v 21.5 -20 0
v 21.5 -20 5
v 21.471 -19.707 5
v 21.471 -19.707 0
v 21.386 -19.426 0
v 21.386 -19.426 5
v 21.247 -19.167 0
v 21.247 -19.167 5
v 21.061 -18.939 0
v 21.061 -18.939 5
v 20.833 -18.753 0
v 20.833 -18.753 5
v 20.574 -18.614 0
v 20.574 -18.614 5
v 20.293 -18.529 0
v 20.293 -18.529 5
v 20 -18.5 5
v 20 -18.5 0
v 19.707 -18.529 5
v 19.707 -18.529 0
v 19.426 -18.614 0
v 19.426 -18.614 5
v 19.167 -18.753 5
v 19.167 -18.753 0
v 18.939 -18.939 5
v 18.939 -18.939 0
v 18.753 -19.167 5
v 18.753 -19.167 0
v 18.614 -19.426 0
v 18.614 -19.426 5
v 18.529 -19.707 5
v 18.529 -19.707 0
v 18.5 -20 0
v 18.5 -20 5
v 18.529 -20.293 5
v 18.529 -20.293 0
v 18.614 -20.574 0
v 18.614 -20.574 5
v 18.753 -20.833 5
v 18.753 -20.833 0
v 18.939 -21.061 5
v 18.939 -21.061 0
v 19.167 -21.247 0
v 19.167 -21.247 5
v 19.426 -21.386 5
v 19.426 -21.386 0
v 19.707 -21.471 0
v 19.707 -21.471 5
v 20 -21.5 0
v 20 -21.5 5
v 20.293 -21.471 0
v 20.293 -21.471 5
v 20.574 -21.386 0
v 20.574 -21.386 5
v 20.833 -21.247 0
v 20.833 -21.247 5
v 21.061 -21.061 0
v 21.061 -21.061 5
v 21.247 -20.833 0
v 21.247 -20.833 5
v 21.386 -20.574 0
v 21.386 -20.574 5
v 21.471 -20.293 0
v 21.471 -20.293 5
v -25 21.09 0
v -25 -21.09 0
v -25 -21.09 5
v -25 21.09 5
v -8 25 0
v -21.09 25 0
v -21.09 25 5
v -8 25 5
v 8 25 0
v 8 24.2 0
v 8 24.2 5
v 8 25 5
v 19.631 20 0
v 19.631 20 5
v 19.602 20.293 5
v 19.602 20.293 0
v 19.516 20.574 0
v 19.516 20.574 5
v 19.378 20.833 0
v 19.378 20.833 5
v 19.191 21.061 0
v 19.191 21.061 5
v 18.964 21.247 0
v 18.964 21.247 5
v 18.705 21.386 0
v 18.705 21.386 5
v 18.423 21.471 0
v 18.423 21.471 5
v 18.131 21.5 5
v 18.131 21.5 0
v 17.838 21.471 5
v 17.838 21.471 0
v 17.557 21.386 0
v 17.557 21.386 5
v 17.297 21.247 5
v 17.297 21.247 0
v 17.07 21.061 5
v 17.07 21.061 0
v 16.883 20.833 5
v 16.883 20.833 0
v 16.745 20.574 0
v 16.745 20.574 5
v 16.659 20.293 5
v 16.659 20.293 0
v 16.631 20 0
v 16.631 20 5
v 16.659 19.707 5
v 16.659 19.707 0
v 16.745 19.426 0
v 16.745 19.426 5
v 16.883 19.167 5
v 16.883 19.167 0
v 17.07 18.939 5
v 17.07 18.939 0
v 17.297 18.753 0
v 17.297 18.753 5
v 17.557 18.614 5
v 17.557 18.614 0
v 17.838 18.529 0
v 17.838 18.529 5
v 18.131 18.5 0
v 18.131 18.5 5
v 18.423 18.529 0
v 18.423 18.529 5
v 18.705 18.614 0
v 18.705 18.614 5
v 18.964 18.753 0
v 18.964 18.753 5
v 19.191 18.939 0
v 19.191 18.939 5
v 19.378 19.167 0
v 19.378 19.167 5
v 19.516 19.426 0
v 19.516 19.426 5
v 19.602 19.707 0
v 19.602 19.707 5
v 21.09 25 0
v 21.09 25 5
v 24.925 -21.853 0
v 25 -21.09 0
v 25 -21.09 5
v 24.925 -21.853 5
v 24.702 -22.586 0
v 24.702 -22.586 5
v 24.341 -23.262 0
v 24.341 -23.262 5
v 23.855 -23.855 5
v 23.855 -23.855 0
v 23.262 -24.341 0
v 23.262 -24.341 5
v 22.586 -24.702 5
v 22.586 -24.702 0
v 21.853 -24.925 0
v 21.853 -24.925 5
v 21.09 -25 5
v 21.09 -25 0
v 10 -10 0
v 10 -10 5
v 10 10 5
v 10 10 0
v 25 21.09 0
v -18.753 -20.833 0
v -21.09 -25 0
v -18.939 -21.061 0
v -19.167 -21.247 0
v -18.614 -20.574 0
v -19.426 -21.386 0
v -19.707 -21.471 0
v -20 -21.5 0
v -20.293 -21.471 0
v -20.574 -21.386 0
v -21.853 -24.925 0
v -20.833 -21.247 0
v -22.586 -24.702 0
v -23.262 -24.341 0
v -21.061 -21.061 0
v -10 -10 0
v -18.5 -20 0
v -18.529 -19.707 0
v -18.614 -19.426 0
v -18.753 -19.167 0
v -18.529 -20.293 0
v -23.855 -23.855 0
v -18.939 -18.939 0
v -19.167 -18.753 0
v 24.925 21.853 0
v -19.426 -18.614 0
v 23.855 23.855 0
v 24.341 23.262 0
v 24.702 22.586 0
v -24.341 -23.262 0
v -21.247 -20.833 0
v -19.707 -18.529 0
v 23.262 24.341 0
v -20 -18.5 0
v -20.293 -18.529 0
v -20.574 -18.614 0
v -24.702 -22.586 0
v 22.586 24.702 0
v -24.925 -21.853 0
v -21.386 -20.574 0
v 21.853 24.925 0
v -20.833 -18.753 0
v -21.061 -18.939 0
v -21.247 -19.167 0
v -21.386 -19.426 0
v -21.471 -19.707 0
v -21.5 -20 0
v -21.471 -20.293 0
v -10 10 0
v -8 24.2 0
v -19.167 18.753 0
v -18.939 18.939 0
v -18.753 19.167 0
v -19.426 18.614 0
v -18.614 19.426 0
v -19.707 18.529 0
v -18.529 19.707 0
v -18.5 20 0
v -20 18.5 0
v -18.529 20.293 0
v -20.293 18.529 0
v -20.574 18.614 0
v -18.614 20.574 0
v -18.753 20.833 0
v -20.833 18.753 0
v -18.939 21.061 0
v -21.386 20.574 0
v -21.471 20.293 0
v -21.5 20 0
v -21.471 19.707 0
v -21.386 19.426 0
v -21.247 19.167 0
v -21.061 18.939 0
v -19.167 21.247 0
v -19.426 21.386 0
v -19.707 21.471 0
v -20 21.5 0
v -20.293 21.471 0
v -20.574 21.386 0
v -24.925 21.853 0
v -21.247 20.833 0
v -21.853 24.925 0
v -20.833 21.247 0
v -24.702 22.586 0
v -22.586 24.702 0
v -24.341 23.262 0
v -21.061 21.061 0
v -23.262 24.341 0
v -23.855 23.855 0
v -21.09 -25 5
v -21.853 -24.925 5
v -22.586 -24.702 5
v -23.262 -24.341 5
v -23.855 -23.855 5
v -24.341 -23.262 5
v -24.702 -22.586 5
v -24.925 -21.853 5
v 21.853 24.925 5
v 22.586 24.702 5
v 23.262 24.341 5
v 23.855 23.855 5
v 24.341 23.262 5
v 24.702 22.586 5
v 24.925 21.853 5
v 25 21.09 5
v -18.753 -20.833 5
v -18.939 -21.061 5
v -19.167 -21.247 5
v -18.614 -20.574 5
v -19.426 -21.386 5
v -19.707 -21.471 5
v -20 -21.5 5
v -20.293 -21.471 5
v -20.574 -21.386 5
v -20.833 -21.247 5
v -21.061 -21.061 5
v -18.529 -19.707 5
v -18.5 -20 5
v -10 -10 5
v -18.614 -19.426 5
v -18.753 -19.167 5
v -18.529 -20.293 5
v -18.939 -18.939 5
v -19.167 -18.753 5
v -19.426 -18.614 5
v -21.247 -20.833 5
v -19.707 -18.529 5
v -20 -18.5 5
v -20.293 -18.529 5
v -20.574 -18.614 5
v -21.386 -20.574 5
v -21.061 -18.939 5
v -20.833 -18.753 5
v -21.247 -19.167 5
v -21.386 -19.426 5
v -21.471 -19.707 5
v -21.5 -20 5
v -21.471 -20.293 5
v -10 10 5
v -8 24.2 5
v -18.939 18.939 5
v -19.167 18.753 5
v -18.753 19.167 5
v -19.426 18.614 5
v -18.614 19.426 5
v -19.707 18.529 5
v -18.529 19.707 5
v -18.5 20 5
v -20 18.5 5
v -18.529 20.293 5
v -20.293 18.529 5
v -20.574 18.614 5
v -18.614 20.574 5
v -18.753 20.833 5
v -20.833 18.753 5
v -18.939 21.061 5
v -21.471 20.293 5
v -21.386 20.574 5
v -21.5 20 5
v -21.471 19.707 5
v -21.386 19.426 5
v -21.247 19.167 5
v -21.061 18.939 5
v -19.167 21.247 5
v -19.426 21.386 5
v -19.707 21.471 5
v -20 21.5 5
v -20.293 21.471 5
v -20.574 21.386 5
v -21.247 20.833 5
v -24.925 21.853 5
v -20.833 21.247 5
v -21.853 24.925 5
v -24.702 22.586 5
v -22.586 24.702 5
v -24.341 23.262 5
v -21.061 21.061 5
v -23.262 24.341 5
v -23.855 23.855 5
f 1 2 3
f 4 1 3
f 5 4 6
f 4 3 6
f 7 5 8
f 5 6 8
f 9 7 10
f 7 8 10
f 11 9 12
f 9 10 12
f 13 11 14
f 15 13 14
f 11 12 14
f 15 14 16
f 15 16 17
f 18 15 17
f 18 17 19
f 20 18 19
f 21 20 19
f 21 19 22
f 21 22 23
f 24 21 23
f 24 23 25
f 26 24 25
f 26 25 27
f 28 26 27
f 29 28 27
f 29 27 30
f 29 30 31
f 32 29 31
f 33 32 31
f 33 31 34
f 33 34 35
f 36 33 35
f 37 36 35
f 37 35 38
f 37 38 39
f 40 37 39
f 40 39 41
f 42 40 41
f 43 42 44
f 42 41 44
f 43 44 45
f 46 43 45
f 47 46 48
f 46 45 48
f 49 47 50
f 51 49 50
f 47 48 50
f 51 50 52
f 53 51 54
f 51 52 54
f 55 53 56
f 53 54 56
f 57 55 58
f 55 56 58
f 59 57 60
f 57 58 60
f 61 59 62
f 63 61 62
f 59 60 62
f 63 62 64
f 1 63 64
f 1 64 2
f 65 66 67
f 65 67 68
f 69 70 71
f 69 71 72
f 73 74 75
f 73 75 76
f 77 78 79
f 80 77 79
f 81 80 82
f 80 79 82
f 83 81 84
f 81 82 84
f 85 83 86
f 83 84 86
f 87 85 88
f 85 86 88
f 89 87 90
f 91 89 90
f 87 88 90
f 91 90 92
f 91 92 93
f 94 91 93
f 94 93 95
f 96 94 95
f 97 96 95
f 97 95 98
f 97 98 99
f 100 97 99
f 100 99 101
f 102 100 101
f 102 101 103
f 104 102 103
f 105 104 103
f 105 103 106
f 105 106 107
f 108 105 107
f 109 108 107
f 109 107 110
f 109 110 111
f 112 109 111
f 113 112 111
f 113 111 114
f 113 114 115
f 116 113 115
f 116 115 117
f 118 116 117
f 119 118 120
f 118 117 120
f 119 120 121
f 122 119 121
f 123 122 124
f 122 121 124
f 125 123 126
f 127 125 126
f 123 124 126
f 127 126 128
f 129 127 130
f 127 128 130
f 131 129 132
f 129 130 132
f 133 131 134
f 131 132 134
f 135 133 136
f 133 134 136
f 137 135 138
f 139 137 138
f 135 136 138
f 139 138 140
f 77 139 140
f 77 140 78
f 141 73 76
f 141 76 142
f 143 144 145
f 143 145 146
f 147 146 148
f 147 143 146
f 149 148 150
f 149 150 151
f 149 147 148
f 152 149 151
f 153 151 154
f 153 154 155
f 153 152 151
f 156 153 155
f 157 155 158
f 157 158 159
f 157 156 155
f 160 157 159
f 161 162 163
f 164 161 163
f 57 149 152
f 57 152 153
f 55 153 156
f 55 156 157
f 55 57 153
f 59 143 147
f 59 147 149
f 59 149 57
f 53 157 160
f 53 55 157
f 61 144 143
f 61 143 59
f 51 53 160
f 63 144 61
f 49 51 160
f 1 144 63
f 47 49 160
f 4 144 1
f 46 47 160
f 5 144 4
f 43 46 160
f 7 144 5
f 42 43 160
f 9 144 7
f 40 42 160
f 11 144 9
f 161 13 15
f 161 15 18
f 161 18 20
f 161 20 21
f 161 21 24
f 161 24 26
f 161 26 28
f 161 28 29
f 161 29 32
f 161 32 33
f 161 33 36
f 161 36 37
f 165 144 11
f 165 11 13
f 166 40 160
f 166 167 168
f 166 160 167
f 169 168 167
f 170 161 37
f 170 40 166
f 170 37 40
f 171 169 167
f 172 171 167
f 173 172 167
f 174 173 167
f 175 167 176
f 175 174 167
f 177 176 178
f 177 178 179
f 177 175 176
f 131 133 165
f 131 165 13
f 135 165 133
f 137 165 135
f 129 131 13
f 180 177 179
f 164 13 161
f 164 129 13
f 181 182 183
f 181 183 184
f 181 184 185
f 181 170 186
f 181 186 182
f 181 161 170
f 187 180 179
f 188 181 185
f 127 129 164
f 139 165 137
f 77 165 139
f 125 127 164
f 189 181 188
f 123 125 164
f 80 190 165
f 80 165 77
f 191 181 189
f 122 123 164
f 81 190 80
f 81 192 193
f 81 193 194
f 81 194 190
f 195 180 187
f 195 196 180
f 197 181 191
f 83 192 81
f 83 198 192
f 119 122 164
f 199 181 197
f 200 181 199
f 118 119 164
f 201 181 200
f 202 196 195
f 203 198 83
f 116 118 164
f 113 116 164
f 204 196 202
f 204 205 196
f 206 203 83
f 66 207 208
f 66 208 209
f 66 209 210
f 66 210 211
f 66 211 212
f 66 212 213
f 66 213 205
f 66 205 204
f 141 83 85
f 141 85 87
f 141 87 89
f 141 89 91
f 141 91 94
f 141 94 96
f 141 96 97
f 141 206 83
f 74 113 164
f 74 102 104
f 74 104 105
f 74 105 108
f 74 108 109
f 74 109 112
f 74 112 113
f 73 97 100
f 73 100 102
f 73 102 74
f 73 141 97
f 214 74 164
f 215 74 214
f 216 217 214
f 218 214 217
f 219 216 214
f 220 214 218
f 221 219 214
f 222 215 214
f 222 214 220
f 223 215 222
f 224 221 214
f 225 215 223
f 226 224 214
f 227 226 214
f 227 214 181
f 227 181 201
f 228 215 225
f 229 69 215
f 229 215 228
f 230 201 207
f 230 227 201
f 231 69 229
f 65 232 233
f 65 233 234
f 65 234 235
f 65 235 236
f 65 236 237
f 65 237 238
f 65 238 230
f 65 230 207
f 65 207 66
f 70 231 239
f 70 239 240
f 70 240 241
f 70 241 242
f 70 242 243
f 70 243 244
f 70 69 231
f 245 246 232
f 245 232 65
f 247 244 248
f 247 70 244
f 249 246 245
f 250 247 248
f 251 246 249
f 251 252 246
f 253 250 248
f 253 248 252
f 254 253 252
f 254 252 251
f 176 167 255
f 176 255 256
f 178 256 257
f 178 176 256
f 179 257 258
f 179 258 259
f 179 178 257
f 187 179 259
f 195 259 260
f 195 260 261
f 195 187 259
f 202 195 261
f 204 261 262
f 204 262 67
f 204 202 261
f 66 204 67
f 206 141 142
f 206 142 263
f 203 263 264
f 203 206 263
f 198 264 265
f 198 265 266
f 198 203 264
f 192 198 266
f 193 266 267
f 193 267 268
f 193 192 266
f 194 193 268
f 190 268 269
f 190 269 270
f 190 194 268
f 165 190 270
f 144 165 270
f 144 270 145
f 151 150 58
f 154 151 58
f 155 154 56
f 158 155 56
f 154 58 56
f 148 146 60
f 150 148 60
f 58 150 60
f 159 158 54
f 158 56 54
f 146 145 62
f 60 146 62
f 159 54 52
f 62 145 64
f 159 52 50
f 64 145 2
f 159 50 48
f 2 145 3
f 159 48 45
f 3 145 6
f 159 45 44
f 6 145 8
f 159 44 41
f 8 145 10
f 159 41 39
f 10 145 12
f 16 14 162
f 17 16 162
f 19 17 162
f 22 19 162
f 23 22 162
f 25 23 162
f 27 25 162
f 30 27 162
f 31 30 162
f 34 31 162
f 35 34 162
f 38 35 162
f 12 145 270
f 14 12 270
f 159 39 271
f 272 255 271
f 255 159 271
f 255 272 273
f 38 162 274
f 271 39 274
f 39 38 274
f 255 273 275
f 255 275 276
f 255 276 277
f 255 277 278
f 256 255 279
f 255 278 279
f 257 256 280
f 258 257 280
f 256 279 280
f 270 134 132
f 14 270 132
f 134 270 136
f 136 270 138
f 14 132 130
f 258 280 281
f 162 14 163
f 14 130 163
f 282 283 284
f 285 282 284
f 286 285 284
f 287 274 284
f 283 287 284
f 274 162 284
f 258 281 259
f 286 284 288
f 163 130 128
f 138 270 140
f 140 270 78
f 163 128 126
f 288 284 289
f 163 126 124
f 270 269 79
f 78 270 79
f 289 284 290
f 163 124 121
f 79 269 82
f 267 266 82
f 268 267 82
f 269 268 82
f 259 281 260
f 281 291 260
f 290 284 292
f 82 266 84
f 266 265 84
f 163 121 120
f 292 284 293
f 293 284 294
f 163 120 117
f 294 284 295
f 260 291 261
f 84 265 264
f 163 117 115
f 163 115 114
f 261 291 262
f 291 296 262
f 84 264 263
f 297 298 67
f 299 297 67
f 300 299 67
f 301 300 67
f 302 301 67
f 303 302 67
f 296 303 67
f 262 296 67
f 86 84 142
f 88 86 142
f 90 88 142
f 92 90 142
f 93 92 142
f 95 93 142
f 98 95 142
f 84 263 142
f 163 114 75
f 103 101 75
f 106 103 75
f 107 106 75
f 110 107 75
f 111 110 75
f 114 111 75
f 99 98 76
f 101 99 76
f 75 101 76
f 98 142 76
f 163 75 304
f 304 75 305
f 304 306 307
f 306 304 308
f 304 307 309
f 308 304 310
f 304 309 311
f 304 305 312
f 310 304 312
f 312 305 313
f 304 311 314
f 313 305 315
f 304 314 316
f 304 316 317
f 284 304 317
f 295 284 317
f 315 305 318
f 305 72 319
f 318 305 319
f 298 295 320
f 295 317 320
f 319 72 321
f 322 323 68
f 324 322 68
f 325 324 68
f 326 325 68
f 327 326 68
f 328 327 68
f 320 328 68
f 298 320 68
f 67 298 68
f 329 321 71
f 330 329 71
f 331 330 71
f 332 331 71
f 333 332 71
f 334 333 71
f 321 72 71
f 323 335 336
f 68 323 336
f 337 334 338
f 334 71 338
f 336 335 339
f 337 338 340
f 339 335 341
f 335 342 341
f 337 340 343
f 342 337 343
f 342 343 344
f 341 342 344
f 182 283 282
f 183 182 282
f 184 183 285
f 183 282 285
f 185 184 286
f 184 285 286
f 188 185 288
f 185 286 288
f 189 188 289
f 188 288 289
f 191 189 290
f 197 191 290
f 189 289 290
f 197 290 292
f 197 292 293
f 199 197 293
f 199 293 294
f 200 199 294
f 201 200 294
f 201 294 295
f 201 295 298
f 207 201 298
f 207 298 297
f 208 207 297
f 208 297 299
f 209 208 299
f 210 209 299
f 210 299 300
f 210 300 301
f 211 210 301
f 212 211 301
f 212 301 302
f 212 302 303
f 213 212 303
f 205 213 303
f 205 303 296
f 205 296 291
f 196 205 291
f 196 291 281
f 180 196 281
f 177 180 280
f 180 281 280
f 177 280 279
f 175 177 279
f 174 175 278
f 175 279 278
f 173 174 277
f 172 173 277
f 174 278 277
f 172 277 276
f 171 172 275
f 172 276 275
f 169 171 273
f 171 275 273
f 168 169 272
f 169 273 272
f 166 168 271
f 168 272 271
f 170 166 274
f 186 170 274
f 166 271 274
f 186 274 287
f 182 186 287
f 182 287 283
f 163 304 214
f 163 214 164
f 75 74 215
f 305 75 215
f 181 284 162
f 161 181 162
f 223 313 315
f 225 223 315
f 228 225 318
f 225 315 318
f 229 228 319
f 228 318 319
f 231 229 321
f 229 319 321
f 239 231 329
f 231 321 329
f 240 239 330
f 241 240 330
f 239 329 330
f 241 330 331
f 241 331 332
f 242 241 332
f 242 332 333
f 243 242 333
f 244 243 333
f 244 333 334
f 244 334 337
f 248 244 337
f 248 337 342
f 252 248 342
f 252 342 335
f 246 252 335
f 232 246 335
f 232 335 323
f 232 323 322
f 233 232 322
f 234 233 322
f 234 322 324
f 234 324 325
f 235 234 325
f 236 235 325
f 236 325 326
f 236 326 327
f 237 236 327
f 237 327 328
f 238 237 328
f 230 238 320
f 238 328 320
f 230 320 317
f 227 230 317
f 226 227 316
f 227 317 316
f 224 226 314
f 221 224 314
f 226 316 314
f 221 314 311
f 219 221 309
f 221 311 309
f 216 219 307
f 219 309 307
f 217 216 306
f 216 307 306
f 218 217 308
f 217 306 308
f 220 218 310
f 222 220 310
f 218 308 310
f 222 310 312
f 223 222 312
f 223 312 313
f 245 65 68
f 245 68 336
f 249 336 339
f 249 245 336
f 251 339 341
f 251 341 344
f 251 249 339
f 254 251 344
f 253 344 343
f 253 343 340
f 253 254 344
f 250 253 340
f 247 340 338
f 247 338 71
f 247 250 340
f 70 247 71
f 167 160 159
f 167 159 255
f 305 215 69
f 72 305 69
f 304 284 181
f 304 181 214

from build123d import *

# Parameters (mm, degrees)
BOSS_EXTRUDE1_DEPTH = 5
SKETCH2_W           = 20
SKETCH2_H           = 20
CUT_EXTRUDE1_DEPTH  = 5
SKETCH5_R           = 1.5
CUT_EXTRUDE2_DEPTH  = 36.707142143
SKETCH6_W           = 16
SKETCH6_H           = 0.8
CUT_EXTRUDE3_DEPTH  = 36.707142143


with BuildPart() as part:
    # Sketch1 → Boss-Extrude1 (new body)
    with BuildSketch(Plane.XY):
        with BuildLine():
            Line((-21.09, 25), (21.09, 25))
            ThreePointArc((21.09, 25), (23.854787514, 23.854787514), (25, 21.09))
            Line((25, 21.09), (25, -21.09))
            ThreePointArc((25, -21.09), (23.854787514, -23.854787514), (21.09, -25))
            Line((21.09, -25), (20.757353845, -25))
            Line((20.757353845, -25), (-21.09, -25))
            ThreePointArc((-21.09, -25), (-23.854787514, -23.854787514), (-25, -21.09))
            Line((-25, -21.09), (-25, 21.09))
            ThreePointArc((-25, 21.09), (-23.854787514, 23.854787514), (-21.09, 25))
        make_face()
    extrude(amount=BOSS_EXTRUDE1_DEPTH)

    # Sketch2 → Cut-Extrude1 (cut)
    with BuildSketch(Plane.XY.offset(5)):
        Rectangle(SKETCH2_W, SKETCH2_H)
    extrude(amount=-CUT_EXTRUDE1_DEPTH, mode=Mode.SUBTRACT)

    # Sketch5 → Cut-Extrude2 (cut, through all)
    with BuildSketch(Plane.XY.offset(5)):
        with Locations((-20, 20)):
            Circle(SKETCH5_R)
        with Locations((18.13054205, 20)):
            Circle(SKETCH5_R)
        with Locations((-20, -20)):
            Circle(SKETCH5_R)
        with Locations((20, -20)):
            Circle(SKETCH5_R)
    extrude(amount=-CUT_EXTRUDE2_DEPTH, mode=Mode.SUBTRACT)

    # Sketch6 → Cut-Extrude3 (cut, through all)
    with BuildSketch(Plane(origin=(0, 0, 0), x_dir=(-1, 0, 0), z_dir=(0, 0, -1))):
        with Locations((0, 24.6)):
            Rectangle(SKETCH6_W, SKETCH6_H)
    extrude(amount=-CUT_EXTRUDE3_DEPTH, mode=Mode.SUBTRACT)


solid = part.part
